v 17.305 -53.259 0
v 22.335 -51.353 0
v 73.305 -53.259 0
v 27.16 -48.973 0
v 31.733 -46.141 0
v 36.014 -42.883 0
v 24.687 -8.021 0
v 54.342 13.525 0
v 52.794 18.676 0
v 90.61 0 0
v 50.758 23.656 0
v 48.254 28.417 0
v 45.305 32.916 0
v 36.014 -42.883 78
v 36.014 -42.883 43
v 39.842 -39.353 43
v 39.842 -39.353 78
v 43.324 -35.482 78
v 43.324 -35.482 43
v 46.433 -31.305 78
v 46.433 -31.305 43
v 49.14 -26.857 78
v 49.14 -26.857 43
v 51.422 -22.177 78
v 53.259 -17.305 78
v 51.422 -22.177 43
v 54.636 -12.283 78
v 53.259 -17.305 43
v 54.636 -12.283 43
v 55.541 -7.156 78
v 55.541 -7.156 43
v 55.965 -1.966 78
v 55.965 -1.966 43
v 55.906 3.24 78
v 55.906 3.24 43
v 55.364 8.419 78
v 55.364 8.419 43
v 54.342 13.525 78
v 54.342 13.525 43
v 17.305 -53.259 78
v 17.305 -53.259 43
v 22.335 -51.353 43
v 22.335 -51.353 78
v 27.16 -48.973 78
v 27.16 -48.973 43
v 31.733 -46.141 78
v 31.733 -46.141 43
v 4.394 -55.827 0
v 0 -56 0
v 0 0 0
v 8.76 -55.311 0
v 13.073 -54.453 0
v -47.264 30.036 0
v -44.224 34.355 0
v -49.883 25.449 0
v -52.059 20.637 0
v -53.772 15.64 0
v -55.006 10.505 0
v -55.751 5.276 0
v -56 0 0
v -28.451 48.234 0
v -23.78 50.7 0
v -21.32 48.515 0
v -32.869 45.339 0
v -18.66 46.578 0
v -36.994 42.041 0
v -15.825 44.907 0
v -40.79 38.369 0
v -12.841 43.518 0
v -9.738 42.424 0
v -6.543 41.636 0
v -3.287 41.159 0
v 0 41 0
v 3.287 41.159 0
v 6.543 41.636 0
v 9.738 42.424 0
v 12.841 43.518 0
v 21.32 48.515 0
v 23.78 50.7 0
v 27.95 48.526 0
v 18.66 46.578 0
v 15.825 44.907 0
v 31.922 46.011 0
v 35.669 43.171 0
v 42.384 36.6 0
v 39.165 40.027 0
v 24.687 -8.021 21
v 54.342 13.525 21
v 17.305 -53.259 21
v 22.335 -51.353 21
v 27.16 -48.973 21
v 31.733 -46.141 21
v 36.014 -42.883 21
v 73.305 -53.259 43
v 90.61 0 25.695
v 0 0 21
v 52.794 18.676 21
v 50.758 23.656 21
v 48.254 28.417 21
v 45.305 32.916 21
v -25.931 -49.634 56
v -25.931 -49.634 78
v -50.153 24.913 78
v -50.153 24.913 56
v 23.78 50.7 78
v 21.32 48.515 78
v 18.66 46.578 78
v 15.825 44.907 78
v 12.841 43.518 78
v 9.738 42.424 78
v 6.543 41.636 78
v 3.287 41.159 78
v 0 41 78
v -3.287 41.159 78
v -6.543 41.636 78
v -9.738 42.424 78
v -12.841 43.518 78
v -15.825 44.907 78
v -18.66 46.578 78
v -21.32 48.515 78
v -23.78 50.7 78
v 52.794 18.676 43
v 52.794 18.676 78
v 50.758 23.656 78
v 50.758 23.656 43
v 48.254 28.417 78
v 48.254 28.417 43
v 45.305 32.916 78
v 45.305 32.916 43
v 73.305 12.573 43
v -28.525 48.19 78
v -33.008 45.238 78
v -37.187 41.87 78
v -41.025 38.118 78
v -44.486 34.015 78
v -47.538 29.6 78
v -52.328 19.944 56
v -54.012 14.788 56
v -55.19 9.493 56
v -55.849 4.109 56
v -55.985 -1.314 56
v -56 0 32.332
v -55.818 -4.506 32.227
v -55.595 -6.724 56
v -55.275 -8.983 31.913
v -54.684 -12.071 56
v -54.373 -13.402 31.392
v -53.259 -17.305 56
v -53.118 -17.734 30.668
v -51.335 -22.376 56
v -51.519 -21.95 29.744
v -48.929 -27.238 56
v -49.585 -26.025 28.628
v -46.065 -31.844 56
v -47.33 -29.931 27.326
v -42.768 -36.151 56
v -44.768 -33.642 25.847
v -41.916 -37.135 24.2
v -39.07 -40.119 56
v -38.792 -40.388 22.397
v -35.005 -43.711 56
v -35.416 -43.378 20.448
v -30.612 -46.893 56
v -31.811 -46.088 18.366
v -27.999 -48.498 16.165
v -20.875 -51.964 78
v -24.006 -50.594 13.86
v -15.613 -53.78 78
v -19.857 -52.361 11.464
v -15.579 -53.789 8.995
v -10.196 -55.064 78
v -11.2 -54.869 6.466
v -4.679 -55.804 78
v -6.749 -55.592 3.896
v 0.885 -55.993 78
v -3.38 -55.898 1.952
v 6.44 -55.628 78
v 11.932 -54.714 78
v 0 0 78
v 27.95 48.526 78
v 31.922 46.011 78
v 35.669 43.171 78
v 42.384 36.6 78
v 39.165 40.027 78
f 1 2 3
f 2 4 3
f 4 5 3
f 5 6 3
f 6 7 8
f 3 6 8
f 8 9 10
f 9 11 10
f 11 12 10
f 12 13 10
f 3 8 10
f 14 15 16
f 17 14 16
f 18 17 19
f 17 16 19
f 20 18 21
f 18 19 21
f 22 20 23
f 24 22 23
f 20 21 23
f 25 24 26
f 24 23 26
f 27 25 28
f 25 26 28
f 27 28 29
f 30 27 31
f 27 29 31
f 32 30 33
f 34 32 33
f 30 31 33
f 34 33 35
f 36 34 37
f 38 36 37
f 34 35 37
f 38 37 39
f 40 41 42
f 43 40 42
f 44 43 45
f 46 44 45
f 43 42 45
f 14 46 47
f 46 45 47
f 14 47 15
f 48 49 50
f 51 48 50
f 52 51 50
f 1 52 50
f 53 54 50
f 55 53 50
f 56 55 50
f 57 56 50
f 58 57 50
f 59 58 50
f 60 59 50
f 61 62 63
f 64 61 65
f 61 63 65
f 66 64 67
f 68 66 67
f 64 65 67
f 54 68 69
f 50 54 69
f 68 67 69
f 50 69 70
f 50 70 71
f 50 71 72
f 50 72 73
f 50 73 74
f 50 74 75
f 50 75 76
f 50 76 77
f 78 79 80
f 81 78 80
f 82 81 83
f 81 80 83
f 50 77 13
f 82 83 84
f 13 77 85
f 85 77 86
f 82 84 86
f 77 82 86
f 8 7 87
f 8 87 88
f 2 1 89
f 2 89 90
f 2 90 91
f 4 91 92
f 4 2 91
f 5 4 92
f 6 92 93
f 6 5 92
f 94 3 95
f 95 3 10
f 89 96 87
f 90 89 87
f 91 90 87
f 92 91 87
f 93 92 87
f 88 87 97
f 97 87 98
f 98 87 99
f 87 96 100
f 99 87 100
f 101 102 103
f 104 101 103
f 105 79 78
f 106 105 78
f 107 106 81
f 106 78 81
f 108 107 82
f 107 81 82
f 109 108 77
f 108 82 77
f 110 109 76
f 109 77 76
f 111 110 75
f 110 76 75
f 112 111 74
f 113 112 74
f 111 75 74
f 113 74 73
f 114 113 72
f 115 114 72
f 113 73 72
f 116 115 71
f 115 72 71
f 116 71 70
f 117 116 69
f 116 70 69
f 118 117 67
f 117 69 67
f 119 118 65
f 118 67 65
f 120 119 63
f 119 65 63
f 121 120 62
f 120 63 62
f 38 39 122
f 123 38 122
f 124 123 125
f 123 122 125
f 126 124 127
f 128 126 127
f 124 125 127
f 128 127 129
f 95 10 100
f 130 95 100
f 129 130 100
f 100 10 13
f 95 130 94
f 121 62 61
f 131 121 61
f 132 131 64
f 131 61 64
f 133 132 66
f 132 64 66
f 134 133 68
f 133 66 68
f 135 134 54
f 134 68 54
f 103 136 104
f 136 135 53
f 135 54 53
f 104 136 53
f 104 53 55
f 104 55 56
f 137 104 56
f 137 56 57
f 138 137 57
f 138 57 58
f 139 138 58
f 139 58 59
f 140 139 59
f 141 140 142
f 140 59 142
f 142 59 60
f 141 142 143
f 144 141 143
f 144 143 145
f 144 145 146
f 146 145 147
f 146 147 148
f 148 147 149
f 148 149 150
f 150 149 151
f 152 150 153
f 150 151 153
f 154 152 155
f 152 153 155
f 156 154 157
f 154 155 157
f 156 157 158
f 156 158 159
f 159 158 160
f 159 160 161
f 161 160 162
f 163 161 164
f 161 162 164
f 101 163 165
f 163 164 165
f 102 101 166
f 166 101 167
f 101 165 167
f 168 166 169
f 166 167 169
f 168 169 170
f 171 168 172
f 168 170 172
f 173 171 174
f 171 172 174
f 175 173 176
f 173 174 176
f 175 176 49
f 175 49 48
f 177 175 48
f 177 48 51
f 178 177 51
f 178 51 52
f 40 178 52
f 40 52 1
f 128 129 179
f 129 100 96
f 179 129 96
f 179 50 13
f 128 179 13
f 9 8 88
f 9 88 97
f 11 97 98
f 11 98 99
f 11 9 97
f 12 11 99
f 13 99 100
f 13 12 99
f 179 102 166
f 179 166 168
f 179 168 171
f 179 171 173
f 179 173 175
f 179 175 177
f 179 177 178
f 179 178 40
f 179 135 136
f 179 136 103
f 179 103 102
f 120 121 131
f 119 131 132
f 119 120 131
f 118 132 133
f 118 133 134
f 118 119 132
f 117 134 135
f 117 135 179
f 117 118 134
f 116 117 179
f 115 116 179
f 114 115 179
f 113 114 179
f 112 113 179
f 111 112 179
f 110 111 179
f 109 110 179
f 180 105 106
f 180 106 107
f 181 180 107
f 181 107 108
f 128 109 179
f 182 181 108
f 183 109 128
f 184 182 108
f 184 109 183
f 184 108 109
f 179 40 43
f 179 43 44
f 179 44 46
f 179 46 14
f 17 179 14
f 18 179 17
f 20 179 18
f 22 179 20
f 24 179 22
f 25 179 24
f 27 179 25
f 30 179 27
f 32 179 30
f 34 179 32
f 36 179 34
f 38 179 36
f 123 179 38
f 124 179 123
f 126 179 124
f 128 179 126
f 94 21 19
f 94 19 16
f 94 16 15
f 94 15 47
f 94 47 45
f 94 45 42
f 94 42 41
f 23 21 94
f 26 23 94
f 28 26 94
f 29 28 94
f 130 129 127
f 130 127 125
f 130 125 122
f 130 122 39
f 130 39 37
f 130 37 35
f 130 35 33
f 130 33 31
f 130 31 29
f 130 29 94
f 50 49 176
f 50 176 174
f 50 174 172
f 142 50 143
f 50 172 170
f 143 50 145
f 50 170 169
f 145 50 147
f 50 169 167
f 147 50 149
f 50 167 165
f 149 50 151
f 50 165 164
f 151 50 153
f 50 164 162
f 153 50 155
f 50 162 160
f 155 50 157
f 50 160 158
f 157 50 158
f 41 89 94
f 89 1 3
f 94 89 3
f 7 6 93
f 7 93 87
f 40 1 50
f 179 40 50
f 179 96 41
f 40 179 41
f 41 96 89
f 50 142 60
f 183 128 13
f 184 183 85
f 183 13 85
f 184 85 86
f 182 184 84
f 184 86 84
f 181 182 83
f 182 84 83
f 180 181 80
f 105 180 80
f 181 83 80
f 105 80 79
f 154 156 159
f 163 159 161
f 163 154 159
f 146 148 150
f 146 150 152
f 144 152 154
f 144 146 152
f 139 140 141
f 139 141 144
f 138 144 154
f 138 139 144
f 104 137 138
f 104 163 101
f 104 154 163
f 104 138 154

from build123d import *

# Parameters (mm, degrees)
F1_DEPTH  = 78
F2_DEPTH  = 43
F4_DEPTH  = 22
F7_DEPTH  = 56
F11_DEPTH = 15
F12_DEPTH = 78
F13_DEPTH = 21
F14_DEPTH = 15


with BuildPart() as f1:
    # F0 (on Top) → F1 (new body)
    with BuildSketch(Plane.XY):
        with BuildLine():
            Line((17.304951685, -53.2591649125), (0, 0))
            Line((0, 0), (45.304951685, 32.9159741284))
            ThreePointArc((45.304951685, 32.9159741284), (35.6688410129, 43.1709830882), (23.7804541588, 50.7))
            ThreePointArc((23.7804541588, 50.7), (0, 41), (-23.7804541588, 50.7))
            ThreePointArc((-23.7804541588, 50.7), (-52.0803228235, -20.5825162359), (17.304951685, -53.2591649125))
        make_face()
    extrude(amount=F1_DEPTH)

    # F3 (on face) → F4 (cut)
    with BuildSketch(Plane.XY.offset(78)):
        with BuildLine():
            ThreePointArc((-50.1532039809, 24.9129711286), (-53.2591649125, -17.304951685), (-25.9313173227, -49.6343306786))
            Line((-25.9313173227, -49.6343306786), (-50.1532039809, 24.9129711286))
        make_face()
    extrude(amount=-F4_DEPTH, mode=Mode.SUBTRACT)

    # F6 (on offset) → F7 (cut)
    with BuildSketch(Plane.XZ.offset(56)):
        Polygon((-56, 0), (0, 0), (-56, 32.3316150746), align=None)
    extrude(amount=-F7_DEPTH, mode=Mode.SUBTRACT)

    # F10 (on face) → F14 (cut)
    with BuildSketch(Plane(origin=(58.1524758425, 0, 58.1524758425), x_dir=(0.7071067812, 0, -0.7071067812), z_dir=(-0.7071067812, 0, -0.7071067812))):
        Polygon((21.42883684, -12.5727833442), (45.9017342091, 0), (21.42883684, 53.2591649125), align=None)
    extrude(amount=-F14_DEPTH, mode=Mode.SUBTRACT)


with BuildPart() as f1b:
    # F0 (on Top) → F1, piece 2 (new body)
    with BuildSketch(Plane.XY):
        with BuildLine():
            ThreePointArc((36.0143064054, -42.8832103992), (53.2591649125, -17.304951685), (54.3423045662, 13.5245678096))
            Line((54.3423045662, 13.5245678096), (24.6869805963, -8.0212862363))
            Line((24.6869805963, -8.0212862363), (36.0143064054, -42.8832103992))
        make_face()
    extrude(amount=F1_DEPTH)

    # F0 (on Top) → F2 (join)
    with BuildSketch(Plane.XY):
        with BuildLine():
            Line((90.60990337, 0), (45.304951685, 32.9159741284))
            ThreePointArc((45.304951685, 32.9159741284), (50.7582562678, 23.6558538347), (54.3423045662, 13.5245678096))
            ThreePointArc((54.3423045662, 13.5245678096), (53.2591649125, -17.304951685), (36.0143064054, -42.8832103992))
            ThreePointArc((36.0143064054, -42.8832103992), (27.1597299111, -48.972942235), (17.304951685, -53.2591649125))
            Line((17.304951685, -53.2591649125), (73.304951685, -53.2591649125))
            Line((73.304951685, -53.2591649125), (90.60990337, 0))
        make_face()
    extrude(amount=F2_DEPTH)

    # F10 (on face) → F11 (cut)
    with BuildSketch(Plane(origin=(58.1524758425, 0, 58.1524758425), x_dir=(0.7071067812, 0, -0.7071067812), z_dir=(-0.7071067812, 0, -0.7071067812))):
        Polygon((21.42883684, -12.5727833442), (45.9017342091, 0), (21.42883684, 53.2591649125), align=None)
    extrude(amount=-F11_DEPTH, mode=Mode.SUBTRACT)

    # F0 (on Top) → F12 (join)
    with BuildSketch(Plane.XY):
        with BuildLine():
            Line((45.304951685, 32.9159741284), (0, 0))
            Line((0, 0), (17.304951685, -53.2591649125))
            ThreePointArc((17.304951685, -53.2591649125), (27.1597299111, -48.972942235), (36.0143064054, -42.8832103992))
            Line((36.0143064054, -42.8832103992), (24.6869805963, -8.0212862363))
            Line((24.6869805963, -8.0212862363), (54.3423045662, 13.5245678096))
            ThreePointArc((54.3423045662, 13.5245678096), (50.7582562678, 23.6558538347), (45.304951685, 32.9159741284))
        make_face()
    extrude(amount=F12_DEPTH)

    # F0 (on Top) → F13 (cut)
    with BuildSketch(Plane.XY):
        with BuildLine():
            Line((45.304951685, 32.9159741284), (0, 0))
            Line((0, 0), (17.304951685, -53.2591649125))
            ThreePointArc((17.304951685, -53.2591649125), (27.1597299111, -48.972942235), (36.0143064054, -42.8832103992))
            Line((36.0143064054, -42.8832103992), (24.6869805963, -8.0212862363))
            Line((24.6869805963, -8.0212862363), (54.3423045662, 13.5245678096))
            ThreePointArc((54.3423045662, 13.5245678096), (50.7582562678, 23.6558538347), (45.304951685, 32.9159741284))
        make_face()
    extrude(amount=F13_DEPTH, mode=Mode.SUBTRACT)


solid = Compound([f1.part, f1b.part])
